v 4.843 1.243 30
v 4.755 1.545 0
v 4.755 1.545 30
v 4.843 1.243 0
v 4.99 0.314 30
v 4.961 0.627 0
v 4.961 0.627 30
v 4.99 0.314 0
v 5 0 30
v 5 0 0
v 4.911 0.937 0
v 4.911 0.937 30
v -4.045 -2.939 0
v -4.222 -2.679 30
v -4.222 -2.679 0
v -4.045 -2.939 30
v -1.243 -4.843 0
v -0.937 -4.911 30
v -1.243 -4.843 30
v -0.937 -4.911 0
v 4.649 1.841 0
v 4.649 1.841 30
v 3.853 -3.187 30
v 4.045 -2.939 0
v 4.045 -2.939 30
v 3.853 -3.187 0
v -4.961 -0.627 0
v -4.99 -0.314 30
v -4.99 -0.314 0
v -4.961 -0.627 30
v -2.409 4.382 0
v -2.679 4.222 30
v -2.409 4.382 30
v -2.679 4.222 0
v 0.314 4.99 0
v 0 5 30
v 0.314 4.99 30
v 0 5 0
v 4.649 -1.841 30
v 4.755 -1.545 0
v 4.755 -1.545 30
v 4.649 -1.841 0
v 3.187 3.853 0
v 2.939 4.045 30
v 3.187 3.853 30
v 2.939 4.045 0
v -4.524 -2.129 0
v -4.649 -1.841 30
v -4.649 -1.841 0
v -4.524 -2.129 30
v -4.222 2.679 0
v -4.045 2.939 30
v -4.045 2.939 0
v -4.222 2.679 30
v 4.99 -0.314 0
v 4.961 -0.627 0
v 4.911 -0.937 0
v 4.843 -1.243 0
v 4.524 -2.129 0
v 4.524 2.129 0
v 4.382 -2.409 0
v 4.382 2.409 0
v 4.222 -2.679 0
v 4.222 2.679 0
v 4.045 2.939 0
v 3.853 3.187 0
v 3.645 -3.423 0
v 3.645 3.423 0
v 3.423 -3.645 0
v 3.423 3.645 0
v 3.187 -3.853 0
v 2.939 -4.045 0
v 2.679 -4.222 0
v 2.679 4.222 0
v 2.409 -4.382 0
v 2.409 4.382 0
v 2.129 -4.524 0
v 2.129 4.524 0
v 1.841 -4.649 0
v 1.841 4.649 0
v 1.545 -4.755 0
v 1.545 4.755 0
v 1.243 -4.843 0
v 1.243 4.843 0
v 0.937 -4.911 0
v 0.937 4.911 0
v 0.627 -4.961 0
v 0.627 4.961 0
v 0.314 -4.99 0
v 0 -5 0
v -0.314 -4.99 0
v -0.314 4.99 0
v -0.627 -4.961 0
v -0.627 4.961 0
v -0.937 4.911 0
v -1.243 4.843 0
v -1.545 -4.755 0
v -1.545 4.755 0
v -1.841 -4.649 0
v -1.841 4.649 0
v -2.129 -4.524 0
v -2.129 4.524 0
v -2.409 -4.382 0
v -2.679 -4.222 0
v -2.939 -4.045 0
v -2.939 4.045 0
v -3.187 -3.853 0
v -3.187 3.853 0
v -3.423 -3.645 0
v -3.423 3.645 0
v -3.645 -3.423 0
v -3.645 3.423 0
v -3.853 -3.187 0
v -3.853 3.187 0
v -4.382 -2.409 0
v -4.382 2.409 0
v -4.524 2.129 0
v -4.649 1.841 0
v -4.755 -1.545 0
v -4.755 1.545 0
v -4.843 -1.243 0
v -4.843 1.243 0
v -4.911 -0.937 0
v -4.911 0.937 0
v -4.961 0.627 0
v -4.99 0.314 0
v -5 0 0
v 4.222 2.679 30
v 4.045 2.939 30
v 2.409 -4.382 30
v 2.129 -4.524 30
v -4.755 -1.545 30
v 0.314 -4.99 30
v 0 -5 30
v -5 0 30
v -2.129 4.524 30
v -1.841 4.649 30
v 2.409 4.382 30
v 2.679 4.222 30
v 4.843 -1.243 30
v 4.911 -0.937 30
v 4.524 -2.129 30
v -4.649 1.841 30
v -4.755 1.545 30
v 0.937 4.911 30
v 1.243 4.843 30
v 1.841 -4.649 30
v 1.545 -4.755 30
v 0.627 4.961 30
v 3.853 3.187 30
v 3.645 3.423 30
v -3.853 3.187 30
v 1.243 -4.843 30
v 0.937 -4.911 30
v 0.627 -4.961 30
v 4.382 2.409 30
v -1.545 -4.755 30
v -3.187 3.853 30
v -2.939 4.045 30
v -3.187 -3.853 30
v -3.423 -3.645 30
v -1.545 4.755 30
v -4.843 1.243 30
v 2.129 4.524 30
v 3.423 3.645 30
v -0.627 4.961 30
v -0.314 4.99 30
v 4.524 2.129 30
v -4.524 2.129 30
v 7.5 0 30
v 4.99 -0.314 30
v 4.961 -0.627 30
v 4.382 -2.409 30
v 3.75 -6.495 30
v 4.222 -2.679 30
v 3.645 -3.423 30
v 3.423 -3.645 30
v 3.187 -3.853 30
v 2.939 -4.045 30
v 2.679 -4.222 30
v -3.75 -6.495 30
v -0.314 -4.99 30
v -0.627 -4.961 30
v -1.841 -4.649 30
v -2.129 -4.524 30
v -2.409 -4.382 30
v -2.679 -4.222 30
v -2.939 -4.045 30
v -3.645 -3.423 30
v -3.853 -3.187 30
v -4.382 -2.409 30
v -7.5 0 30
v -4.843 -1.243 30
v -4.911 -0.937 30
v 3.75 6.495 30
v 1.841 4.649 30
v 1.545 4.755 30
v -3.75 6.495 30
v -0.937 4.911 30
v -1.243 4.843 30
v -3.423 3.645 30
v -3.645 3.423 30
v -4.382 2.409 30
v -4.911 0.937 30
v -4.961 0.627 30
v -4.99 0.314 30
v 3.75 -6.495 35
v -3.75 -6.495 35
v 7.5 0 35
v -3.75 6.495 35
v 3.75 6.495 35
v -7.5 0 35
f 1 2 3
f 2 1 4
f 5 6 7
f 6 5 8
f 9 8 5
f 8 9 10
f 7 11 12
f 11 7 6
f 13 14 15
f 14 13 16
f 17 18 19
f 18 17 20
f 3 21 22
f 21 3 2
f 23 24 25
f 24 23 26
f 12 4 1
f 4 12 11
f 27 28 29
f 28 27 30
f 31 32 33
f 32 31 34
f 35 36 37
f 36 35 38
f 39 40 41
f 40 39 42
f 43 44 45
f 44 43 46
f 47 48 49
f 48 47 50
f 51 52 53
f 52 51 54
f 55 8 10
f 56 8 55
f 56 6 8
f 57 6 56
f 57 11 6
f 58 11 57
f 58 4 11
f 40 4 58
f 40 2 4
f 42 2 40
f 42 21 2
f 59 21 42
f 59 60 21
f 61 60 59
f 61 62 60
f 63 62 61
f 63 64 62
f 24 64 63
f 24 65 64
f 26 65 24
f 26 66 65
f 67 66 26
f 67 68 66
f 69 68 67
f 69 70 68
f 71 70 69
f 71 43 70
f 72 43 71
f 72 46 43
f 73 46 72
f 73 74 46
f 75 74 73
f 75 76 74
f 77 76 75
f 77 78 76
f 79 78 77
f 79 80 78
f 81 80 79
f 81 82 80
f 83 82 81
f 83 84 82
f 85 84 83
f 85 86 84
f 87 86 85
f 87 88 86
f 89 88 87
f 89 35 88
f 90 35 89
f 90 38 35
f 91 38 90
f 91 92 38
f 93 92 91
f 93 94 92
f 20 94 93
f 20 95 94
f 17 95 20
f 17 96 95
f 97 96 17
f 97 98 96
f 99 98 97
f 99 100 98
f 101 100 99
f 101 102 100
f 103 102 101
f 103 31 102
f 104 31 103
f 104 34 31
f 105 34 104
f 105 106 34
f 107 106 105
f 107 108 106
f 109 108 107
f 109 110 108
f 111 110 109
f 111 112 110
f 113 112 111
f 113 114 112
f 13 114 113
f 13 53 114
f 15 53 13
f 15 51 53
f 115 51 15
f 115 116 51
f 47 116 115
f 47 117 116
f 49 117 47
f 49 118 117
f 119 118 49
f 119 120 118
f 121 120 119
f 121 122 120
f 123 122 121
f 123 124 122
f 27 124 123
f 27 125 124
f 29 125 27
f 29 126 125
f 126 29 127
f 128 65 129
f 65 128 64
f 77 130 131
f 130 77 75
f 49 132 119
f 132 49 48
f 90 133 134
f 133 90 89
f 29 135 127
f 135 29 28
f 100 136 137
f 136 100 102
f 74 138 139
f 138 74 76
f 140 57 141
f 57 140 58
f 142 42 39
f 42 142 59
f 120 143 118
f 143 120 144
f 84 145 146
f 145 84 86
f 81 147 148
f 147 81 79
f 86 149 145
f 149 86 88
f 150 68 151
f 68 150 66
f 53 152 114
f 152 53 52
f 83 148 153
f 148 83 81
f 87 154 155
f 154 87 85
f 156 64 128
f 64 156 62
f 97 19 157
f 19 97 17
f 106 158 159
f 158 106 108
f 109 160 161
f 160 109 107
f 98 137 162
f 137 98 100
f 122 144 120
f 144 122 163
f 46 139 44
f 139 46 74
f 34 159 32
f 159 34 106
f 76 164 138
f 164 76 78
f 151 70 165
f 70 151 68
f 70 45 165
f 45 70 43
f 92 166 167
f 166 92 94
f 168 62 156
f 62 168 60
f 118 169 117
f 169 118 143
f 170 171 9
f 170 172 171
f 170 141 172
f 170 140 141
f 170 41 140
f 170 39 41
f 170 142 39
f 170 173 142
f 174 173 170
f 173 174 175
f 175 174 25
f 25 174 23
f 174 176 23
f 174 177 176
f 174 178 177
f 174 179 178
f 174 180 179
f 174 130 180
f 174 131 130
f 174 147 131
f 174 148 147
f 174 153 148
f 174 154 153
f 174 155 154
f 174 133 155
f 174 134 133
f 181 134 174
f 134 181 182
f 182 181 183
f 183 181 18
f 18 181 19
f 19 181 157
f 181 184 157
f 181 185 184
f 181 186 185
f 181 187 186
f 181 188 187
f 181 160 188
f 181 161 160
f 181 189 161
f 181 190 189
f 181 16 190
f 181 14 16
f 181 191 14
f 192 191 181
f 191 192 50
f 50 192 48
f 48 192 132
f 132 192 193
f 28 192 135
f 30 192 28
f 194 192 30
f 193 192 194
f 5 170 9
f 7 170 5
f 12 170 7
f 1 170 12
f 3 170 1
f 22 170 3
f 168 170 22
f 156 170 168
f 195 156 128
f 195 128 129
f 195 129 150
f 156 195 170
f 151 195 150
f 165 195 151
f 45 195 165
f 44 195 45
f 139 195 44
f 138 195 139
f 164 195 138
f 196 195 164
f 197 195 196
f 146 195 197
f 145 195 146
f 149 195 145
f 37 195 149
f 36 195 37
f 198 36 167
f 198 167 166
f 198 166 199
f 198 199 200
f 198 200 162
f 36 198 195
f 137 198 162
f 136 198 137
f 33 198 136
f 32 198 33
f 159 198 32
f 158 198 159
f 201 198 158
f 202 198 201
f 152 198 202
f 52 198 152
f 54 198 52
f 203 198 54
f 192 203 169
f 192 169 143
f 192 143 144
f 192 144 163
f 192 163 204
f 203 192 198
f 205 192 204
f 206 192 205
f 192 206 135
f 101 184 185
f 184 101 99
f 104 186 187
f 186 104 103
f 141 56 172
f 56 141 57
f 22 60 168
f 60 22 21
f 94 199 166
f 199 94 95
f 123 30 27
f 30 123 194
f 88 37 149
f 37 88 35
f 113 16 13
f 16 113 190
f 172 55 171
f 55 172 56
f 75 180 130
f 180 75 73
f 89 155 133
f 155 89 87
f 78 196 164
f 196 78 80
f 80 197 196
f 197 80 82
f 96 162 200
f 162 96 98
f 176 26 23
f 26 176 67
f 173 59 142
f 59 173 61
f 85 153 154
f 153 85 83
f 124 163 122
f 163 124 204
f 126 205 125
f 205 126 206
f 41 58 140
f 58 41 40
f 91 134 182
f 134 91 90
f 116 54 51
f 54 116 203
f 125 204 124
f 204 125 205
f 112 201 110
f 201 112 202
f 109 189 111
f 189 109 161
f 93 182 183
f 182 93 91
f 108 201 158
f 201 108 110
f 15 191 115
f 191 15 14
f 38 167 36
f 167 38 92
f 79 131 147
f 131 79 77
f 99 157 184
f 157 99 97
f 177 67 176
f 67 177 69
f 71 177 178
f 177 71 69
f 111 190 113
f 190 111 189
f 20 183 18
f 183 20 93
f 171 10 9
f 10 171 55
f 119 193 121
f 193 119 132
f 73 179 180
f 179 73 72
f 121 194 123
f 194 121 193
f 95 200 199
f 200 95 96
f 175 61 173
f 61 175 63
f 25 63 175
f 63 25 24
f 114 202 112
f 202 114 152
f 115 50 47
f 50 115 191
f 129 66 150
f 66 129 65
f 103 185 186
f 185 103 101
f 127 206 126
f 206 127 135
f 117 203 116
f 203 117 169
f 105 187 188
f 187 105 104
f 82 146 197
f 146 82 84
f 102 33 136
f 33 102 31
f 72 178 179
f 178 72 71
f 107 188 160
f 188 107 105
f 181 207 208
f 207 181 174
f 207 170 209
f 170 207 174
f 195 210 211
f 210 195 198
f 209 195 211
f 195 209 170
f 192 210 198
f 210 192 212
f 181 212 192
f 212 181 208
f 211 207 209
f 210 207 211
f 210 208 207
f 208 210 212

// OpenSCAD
module bolt(length=30, diameter=10, head_diameter=15, head_height=5) {
    // Create the bolt shaft
    cylinder(h=length, r=diameter/2, $fn=100);
    
    // Create the hex head
    translate([0, 0, length]) {
        cylinder(h=head_height, r1=head_diameter/2, r2=head_diameter/2, $fn=6);
    }
}

bolt();
